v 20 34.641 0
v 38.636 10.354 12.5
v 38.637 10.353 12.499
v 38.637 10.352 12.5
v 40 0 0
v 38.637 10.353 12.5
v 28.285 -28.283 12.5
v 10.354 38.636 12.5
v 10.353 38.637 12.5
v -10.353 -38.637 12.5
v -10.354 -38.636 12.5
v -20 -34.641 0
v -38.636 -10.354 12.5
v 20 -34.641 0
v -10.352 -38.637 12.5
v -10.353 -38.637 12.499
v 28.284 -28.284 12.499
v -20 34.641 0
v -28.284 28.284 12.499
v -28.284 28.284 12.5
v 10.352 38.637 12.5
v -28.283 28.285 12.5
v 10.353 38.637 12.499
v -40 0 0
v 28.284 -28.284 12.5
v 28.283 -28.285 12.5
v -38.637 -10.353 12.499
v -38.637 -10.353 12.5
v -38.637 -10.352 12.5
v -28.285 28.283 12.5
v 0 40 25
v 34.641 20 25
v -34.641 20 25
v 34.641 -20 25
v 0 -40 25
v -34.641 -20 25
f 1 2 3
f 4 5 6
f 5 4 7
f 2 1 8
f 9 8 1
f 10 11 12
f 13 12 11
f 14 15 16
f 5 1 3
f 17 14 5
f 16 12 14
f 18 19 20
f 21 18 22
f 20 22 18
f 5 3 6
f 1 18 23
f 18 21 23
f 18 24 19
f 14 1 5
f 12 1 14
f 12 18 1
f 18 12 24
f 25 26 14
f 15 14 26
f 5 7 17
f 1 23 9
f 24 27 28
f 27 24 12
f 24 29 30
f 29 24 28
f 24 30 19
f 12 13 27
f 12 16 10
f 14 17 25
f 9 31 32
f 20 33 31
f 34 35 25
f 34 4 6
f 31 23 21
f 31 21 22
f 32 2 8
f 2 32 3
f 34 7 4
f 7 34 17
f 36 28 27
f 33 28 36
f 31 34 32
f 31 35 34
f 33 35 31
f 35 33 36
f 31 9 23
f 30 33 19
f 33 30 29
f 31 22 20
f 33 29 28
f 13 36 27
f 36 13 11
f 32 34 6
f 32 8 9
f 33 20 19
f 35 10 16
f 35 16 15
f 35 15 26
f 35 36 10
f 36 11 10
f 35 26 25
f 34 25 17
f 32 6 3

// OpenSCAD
$fn = 6;

s_radius = 40;
s_height = 25;


//candle(s_radius,s_height);

outer2(s_radius,s_height);

module candle(radius,height)
{
    
difference() {
    outer(radius,height);
    translate([0, 0, 8]) scale([0.90, 0.90, 1]) outer(radius,height);
    translate([0, 0, height*4]) cube([100, 100, 20], center=true);
    translate([0, 0, 6]) cylinder(h=04, r1=21,r2=21, center=true, $fn=32);
}
}



module outer2(radius,height)
{
section2();
rotate([0, 0, 75]) translate([0, 0, height/2]) section2();
//translate([0, 0, height*2]) section2();
//rotate([0, 0, 30]) translate([0, 0, height*3]) section2();
}

module section2()
{
	hull()
	{
		cylinder(h=0.001, r1=s_radius,r2=s_radius, center=true);
		rotate([0, 0, 15]) translate([0, 0, s_height/2]) cylinder(h=0.001, r1=s_radius,r2=s_radius, center=true);
	}
}






module outer(radius,height)
{
section();
rotate([0, 0, 30]) translate([0, 0, height]) section();
translate([0, 0, height*2]) section();
rotate([0, 0, 30]) translate([0, 0, height*3]) section();
}


module section()
{
	hull()
	{
		cylinder(h=0.001, r1=s_radius,r2=s_radius, center=true);
		rotate([0, 0, 30]) translate([0, 0, s_height]) cylinder(h=0.001, r1=s_radius,r2=s_radius, center=true);
	}
}
